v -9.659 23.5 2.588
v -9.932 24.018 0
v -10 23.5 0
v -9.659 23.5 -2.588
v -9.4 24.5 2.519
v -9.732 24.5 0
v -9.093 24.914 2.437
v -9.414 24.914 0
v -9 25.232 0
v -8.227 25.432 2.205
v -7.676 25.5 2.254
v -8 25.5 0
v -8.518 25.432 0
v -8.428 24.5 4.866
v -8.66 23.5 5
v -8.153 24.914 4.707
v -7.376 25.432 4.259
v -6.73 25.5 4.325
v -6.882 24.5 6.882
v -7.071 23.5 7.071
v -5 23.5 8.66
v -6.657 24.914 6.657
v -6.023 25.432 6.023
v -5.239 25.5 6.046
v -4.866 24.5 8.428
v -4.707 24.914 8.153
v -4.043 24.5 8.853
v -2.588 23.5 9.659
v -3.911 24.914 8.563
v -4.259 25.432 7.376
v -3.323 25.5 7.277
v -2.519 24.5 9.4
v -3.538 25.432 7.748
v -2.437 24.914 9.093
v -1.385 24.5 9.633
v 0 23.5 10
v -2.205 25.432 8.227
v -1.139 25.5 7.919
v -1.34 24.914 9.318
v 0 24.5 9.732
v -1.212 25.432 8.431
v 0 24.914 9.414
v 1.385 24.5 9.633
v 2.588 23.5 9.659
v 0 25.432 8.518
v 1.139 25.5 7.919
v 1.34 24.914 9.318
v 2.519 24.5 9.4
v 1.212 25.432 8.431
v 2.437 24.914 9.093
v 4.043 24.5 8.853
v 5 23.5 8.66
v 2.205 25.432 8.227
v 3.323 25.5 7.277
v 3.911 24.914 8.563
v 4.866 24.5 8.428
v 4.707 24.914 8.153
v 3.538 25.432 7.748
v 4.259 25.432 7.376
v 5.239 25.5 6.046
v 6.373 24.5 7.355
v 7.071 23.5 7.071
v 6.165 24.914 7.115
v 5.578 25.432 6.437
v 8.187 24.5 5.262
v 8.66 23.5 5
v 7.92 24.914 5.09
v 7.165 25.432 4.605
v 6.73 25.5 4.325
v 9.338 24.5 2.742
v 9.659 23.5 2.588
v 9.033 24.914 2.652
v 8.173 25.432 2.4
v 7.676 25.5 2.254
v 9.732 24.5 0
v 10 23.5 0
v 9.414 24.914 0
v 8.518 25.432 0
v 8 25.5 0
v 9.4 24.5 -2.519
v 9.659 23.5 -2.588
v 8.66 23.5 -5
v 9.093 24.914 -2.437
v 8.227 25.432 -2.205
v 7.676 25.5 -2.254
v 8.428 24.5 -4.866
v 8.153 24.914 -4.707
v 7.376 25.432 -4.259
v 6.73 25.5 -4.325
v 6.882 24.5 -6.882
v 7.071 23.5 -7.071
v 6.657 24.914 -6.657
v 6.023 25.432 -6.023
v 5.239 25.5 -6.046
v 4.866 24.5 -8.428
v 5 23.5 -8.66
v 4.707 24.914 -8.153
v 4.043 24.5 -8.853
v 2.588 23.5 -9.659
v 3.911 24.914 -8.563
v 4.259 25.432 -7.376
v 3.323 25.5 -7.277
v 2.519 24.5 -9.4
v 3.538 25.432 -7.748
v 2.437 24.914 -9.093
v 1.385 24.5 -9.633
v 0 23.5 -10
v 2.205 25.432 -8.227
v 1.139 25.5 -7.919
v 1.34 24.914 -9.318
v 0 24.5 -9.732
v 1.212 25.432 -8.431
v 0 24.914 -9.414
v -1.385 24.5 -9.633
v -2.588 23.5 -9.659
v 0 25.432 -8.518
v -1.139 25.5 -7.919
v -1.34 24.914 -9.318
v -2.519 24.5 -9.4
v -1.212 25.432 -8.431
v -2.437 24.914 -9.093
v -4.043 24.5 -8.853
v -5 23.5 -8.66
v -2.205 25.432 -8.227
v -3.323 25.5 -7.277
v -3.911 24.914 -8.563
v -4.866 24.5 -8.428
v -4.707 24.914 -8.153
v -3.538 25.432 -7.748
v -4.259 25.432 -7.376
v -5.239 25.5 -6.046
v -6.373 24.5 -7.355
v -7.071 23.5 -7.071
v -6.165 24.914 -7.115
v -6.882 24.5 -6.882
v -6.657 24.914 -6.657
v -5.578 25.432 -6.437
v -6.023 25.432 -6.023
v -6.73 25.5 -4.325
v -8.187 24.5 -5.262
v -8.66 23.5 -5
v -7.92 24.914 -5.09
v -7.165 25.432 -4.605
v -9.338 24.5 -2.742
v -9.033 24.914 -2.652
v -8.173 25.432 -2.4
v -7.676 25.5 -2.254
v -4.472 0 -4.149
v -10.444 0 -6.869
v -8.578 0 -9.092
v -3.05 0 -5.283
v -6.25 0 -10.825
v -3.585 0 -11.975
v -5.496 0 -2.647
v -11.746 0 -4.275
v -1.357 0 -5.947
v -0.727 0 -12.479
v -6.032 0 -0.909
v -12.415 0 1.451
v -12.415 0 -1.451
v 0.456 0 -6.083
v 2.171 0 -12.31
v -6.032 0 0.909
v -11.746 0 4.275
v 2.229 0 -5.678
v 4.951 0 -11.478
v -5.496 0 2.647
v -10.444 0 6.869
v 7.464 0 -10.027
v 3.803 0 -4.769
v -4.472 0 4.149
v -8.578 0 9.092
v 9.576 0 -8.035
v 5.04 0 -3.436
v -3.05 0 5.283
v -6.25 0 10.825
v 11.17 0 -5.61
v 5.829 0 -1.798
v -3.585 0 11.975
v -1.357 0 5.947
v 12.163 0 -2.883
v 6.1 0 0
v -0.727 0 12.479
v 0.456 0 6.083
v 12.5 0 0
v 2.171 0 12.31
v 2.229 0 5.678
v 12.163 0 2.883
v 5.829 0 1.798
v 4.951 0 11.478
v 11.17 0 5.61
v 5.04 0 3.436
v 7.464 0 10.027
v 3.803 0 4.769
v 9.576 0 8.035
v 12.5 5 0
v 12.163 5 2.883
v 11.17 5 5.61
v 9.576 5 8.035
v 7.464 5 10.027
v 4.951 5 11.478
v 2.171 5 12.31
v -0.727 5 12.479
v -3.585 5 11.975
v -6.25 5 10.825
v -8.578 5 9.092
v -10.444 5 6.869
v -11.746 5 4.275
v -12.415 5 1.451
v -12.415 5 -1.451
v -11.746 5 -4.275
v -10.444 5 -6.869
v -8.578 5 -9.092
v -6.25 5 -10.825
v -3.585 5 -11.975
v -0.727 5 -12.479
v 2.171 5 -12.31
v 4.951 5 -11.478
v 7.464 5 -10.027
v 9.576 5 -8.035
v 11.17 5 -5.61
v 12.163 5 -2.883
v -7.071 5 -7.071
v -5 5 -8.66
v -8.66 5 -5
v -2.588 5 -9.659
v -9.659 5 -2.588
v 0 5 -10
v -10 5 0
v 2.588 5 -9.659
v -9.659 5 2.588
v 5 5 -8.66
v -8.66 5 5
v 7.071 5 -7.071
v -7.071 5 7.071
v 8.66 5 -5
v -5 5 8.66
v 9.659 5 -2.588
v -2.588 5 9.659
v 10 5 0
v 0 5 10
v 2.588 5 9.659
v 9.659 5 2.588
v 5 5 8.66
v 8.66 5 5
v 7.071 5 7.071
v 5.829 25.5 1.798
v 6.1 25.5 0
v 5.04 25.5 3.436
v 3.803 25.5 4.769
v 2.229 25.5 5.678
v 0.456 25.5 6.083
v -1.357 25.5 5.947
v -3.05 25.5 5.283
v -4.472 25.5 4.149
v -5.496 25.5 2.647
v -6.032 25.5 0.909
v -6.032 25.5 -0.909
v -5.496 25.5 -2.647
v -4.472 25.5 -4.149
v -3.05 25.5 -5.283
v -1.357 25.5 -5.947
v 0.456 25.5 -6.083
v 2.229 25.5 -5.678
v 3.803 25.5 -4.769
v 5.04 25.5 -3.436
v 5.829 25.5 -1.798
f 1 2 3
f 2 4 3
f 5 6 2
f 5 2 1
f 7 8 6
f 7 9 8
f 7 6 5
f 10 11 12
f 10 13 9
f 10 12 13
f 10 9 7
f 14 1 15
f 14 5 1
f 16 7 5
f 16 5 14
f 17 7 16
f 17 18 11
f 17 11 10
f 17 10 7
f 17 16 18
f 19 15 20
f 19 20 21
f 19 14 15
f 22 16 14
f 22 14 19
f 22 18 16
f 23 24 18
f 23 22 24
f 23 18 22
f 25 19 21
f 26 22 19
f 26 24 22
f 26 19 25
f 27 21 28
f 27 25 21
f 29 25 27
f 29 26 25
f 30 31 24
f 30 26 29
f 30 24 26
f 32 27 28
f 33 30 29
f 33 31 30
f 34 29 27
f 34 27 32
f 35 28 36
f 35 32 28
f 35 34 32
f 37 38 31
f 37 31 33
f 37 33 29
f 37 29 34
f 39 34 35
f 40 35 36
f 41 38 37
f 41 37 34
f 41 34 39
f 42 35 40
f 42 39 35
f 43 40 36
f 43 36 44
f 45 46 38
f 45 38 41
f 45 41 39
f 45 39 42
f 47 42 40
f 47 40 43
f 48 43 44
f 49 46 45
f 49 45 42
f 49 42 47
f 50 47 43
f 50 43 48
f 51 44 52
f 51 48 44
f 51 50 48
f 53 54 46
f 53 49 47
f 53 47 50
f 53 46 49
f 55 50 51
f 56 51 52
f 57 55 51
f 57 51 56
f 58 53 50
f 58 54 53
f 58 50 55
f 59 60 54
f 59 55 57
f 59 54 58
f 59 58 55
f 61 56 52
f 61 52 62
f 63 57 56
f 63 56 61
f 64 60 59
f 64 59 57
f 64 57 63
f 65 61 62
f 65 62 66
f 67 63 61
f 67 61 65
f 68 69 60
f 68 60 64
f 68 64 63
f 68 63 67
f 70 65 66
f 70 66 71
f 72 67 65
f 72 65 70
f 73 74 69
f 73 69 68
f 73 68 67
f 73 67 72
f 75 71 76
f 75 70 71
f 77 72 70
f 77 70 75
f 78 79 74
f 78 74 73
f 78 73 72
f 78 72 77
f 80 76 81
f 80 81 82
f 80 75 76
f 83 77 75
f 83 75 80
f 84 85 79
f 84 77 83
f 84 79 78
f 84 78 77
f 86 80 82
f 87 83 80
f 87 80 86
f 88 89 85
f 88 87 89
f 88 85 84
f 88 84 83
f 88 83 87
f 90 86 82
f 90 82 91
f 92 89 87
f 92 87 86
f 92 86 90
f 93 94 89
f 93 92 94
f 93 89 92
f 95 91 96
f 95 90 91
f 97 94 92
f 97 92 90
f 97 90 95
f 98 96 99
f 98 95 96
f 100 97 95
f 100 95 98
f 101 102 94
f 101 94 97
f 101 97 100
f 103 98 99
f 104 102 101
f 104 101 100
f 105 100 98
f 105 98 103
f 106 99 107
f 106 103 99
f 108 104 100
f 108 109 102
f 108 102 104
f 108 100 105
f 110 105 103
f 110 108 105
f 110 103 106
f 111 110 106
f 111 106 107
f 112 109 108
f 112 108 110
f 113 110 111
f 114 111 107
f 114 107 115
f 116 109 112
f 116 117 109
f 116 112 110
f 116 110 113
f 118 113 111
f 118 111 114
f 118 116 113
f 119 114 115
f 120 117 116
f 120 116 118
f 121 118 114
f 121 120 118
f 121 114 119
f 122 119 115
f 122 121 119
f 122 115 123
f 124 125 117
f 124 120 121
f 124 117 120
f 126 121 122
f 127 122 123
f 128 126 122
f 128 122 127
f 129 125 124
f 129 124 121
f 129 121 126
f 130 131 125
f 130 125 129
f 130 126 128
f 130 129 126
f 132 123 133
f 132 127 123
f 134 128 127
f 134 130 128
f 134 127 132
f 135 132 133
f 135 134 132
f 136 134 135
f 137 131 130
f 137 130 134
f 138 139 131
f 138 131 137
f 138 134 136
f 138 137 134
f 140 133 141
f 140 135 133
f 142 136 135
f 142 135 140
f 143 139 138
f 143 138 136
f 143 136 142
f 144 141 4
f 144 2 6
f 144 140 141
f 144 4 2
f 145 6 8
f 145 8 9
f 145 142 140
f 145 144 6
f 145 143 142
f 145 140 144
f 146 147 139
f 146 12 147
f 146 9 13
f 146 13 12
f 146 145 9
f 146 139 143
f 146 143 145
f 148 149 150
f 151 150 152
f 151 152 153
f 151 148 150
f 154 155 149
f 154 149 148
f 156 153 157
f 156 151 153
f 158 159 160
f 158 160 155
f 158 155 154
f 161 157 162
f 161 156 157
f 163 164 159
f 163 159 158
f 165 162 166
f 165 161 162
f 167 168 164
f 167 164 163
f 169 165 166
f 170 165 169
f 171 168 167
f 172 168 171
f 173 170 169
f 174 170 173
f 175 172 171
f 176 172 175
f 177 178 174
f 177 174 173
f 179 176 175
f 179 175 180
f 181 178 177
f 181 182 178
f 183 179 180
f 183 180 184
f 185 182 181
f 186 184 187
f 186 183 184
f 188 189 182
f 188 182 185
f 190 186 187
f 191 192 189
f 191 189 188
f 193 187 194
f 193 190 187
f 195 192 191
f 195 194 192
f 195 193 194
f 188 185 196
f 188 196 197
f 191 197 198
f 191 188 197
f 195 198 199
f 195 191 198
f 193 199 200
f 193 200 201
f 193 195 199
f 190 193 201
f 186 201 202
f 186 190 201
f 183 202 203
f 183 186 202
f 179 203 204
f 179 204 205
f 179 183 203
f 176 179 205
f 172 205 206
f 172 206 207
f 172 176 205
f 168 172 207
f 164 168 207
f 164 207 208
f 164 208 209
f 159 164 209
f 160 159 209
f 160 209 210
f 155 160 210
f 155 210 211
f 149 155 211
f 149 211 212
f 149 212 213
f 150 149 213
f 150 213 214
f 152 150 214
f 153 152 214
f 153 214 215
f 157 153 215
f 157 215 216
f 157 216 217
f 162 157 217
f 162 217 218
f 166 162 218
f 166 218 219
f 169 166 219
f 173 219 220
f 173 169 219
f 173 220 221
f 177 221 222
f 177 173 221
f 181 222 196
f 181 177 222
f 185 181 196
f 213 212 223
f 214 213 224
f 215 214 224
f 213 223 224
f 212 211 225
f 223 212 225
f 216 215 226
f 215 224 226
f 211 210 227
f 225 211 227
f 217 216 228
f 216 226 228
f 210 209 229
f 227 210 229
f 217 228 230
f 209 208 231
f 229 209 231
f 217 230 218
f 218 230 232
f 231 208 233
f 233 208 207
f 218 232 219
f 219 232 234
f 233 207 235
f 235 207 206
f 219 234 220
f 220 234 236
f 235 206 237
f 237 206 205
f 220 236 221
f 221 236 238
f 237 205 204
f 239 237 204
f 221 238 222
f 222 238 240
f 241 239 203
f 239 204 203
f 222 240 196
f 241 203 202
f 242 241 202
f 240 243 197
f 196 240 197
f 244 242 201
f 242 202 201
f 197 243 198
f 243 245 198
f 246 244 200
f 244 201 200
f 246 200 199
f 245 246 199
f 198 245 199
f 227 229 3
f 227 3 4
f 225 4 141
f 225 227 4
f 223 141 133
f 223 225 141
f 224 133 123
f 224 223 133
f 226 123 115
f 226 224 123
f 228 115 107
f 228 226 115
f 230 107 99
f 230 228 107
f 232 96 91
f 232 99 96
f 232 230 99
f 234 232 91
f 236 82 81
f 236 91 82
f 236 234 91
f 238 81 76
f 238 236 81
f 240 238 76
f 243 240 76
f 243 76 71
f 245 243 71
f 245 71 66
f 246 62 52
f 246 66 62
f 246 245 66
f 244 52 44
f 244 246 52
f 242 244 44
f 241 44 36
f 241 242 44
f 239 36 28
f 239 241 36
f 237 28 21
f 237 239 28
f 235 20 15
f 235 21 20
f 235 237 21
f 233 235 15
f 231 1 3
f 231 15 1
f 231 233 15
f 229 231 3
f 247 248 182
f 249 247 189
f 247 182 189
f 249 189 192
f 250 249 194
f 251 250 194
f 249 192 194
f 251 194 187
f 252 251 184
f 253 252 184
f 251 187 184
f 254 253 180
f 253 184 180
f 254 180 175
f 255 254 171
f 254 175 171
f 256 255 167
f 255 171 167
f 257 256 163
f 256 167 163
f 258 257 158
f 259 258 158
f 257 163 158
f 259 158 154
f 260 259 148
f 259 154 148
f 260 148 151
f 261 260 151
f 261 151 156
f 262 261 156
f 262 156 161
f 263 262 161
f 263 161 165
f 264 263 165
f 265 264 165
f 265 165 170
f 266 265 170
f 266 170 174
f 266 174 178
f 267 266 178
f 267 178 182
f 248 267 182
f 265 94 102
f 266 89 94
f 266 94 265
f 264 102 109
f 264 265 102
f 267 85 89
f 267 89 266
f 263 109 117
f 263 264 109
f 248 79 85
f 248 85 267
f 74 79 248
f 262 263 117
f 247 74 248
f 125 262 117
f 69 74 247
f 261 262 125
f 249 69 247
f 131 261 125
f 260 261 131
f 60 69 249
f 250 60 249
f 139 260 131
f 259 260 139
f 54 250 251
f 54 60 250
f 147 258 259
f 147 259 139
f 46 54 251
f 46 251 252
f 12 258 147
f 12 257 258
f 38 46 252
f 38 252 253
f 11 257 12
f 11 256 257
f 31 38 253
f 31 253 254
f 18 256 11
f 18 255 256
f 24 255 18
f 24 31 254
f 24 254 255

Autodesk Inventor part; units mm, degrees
ref_plane "YZ Plane" through (0, 0, 0) normal (1, 0, 0) x (0, 1, 0)
ref_plane "XZ Plane" through (0, 0, 0) normal (0, 1, 0) x (-1, 0, 0)
ref_plane "XY Plane" through (0, 0, 0) normal (0, 0, 1) x (1, 0, 0)
sketch "Sketch1" plane through (0, 0, 0) normal (0, 1, 0) x (-1, 0, 0)
  circle A0 centre (0, 0) radius 10
  dimension "d0" = 20
extrude "Extrusion1" add sketch "Sketch1" along normal blind 25.5
sketch "Sketch2" plane through (0, 0, 0) normal (0, -1, 0) x (1, 0, 0)
  circle A0 centre (0, 0) radius 6.1
  dimension "d3" = 12.2
extrude "Extrusion2" cut sketch "Sketch2" against normal through all
sketch "Sketch3" plane through (0, 0, 0) normal (0, -1, 0) x (1, 0, 0)
  circle A0 centre (0, 0) radius 10 projected
  circle A1 centre (0, 0) radius 12.5
  dimension "d6" = 25
extrude "Extrusion3" add sketch "Sketch3" against normal blind 5
fillet "Fillet1" radius 2 1 edges at (10, 25.5, 0)
properties part number "Bushing_stempel" material "Brass, Soft Yellow"
